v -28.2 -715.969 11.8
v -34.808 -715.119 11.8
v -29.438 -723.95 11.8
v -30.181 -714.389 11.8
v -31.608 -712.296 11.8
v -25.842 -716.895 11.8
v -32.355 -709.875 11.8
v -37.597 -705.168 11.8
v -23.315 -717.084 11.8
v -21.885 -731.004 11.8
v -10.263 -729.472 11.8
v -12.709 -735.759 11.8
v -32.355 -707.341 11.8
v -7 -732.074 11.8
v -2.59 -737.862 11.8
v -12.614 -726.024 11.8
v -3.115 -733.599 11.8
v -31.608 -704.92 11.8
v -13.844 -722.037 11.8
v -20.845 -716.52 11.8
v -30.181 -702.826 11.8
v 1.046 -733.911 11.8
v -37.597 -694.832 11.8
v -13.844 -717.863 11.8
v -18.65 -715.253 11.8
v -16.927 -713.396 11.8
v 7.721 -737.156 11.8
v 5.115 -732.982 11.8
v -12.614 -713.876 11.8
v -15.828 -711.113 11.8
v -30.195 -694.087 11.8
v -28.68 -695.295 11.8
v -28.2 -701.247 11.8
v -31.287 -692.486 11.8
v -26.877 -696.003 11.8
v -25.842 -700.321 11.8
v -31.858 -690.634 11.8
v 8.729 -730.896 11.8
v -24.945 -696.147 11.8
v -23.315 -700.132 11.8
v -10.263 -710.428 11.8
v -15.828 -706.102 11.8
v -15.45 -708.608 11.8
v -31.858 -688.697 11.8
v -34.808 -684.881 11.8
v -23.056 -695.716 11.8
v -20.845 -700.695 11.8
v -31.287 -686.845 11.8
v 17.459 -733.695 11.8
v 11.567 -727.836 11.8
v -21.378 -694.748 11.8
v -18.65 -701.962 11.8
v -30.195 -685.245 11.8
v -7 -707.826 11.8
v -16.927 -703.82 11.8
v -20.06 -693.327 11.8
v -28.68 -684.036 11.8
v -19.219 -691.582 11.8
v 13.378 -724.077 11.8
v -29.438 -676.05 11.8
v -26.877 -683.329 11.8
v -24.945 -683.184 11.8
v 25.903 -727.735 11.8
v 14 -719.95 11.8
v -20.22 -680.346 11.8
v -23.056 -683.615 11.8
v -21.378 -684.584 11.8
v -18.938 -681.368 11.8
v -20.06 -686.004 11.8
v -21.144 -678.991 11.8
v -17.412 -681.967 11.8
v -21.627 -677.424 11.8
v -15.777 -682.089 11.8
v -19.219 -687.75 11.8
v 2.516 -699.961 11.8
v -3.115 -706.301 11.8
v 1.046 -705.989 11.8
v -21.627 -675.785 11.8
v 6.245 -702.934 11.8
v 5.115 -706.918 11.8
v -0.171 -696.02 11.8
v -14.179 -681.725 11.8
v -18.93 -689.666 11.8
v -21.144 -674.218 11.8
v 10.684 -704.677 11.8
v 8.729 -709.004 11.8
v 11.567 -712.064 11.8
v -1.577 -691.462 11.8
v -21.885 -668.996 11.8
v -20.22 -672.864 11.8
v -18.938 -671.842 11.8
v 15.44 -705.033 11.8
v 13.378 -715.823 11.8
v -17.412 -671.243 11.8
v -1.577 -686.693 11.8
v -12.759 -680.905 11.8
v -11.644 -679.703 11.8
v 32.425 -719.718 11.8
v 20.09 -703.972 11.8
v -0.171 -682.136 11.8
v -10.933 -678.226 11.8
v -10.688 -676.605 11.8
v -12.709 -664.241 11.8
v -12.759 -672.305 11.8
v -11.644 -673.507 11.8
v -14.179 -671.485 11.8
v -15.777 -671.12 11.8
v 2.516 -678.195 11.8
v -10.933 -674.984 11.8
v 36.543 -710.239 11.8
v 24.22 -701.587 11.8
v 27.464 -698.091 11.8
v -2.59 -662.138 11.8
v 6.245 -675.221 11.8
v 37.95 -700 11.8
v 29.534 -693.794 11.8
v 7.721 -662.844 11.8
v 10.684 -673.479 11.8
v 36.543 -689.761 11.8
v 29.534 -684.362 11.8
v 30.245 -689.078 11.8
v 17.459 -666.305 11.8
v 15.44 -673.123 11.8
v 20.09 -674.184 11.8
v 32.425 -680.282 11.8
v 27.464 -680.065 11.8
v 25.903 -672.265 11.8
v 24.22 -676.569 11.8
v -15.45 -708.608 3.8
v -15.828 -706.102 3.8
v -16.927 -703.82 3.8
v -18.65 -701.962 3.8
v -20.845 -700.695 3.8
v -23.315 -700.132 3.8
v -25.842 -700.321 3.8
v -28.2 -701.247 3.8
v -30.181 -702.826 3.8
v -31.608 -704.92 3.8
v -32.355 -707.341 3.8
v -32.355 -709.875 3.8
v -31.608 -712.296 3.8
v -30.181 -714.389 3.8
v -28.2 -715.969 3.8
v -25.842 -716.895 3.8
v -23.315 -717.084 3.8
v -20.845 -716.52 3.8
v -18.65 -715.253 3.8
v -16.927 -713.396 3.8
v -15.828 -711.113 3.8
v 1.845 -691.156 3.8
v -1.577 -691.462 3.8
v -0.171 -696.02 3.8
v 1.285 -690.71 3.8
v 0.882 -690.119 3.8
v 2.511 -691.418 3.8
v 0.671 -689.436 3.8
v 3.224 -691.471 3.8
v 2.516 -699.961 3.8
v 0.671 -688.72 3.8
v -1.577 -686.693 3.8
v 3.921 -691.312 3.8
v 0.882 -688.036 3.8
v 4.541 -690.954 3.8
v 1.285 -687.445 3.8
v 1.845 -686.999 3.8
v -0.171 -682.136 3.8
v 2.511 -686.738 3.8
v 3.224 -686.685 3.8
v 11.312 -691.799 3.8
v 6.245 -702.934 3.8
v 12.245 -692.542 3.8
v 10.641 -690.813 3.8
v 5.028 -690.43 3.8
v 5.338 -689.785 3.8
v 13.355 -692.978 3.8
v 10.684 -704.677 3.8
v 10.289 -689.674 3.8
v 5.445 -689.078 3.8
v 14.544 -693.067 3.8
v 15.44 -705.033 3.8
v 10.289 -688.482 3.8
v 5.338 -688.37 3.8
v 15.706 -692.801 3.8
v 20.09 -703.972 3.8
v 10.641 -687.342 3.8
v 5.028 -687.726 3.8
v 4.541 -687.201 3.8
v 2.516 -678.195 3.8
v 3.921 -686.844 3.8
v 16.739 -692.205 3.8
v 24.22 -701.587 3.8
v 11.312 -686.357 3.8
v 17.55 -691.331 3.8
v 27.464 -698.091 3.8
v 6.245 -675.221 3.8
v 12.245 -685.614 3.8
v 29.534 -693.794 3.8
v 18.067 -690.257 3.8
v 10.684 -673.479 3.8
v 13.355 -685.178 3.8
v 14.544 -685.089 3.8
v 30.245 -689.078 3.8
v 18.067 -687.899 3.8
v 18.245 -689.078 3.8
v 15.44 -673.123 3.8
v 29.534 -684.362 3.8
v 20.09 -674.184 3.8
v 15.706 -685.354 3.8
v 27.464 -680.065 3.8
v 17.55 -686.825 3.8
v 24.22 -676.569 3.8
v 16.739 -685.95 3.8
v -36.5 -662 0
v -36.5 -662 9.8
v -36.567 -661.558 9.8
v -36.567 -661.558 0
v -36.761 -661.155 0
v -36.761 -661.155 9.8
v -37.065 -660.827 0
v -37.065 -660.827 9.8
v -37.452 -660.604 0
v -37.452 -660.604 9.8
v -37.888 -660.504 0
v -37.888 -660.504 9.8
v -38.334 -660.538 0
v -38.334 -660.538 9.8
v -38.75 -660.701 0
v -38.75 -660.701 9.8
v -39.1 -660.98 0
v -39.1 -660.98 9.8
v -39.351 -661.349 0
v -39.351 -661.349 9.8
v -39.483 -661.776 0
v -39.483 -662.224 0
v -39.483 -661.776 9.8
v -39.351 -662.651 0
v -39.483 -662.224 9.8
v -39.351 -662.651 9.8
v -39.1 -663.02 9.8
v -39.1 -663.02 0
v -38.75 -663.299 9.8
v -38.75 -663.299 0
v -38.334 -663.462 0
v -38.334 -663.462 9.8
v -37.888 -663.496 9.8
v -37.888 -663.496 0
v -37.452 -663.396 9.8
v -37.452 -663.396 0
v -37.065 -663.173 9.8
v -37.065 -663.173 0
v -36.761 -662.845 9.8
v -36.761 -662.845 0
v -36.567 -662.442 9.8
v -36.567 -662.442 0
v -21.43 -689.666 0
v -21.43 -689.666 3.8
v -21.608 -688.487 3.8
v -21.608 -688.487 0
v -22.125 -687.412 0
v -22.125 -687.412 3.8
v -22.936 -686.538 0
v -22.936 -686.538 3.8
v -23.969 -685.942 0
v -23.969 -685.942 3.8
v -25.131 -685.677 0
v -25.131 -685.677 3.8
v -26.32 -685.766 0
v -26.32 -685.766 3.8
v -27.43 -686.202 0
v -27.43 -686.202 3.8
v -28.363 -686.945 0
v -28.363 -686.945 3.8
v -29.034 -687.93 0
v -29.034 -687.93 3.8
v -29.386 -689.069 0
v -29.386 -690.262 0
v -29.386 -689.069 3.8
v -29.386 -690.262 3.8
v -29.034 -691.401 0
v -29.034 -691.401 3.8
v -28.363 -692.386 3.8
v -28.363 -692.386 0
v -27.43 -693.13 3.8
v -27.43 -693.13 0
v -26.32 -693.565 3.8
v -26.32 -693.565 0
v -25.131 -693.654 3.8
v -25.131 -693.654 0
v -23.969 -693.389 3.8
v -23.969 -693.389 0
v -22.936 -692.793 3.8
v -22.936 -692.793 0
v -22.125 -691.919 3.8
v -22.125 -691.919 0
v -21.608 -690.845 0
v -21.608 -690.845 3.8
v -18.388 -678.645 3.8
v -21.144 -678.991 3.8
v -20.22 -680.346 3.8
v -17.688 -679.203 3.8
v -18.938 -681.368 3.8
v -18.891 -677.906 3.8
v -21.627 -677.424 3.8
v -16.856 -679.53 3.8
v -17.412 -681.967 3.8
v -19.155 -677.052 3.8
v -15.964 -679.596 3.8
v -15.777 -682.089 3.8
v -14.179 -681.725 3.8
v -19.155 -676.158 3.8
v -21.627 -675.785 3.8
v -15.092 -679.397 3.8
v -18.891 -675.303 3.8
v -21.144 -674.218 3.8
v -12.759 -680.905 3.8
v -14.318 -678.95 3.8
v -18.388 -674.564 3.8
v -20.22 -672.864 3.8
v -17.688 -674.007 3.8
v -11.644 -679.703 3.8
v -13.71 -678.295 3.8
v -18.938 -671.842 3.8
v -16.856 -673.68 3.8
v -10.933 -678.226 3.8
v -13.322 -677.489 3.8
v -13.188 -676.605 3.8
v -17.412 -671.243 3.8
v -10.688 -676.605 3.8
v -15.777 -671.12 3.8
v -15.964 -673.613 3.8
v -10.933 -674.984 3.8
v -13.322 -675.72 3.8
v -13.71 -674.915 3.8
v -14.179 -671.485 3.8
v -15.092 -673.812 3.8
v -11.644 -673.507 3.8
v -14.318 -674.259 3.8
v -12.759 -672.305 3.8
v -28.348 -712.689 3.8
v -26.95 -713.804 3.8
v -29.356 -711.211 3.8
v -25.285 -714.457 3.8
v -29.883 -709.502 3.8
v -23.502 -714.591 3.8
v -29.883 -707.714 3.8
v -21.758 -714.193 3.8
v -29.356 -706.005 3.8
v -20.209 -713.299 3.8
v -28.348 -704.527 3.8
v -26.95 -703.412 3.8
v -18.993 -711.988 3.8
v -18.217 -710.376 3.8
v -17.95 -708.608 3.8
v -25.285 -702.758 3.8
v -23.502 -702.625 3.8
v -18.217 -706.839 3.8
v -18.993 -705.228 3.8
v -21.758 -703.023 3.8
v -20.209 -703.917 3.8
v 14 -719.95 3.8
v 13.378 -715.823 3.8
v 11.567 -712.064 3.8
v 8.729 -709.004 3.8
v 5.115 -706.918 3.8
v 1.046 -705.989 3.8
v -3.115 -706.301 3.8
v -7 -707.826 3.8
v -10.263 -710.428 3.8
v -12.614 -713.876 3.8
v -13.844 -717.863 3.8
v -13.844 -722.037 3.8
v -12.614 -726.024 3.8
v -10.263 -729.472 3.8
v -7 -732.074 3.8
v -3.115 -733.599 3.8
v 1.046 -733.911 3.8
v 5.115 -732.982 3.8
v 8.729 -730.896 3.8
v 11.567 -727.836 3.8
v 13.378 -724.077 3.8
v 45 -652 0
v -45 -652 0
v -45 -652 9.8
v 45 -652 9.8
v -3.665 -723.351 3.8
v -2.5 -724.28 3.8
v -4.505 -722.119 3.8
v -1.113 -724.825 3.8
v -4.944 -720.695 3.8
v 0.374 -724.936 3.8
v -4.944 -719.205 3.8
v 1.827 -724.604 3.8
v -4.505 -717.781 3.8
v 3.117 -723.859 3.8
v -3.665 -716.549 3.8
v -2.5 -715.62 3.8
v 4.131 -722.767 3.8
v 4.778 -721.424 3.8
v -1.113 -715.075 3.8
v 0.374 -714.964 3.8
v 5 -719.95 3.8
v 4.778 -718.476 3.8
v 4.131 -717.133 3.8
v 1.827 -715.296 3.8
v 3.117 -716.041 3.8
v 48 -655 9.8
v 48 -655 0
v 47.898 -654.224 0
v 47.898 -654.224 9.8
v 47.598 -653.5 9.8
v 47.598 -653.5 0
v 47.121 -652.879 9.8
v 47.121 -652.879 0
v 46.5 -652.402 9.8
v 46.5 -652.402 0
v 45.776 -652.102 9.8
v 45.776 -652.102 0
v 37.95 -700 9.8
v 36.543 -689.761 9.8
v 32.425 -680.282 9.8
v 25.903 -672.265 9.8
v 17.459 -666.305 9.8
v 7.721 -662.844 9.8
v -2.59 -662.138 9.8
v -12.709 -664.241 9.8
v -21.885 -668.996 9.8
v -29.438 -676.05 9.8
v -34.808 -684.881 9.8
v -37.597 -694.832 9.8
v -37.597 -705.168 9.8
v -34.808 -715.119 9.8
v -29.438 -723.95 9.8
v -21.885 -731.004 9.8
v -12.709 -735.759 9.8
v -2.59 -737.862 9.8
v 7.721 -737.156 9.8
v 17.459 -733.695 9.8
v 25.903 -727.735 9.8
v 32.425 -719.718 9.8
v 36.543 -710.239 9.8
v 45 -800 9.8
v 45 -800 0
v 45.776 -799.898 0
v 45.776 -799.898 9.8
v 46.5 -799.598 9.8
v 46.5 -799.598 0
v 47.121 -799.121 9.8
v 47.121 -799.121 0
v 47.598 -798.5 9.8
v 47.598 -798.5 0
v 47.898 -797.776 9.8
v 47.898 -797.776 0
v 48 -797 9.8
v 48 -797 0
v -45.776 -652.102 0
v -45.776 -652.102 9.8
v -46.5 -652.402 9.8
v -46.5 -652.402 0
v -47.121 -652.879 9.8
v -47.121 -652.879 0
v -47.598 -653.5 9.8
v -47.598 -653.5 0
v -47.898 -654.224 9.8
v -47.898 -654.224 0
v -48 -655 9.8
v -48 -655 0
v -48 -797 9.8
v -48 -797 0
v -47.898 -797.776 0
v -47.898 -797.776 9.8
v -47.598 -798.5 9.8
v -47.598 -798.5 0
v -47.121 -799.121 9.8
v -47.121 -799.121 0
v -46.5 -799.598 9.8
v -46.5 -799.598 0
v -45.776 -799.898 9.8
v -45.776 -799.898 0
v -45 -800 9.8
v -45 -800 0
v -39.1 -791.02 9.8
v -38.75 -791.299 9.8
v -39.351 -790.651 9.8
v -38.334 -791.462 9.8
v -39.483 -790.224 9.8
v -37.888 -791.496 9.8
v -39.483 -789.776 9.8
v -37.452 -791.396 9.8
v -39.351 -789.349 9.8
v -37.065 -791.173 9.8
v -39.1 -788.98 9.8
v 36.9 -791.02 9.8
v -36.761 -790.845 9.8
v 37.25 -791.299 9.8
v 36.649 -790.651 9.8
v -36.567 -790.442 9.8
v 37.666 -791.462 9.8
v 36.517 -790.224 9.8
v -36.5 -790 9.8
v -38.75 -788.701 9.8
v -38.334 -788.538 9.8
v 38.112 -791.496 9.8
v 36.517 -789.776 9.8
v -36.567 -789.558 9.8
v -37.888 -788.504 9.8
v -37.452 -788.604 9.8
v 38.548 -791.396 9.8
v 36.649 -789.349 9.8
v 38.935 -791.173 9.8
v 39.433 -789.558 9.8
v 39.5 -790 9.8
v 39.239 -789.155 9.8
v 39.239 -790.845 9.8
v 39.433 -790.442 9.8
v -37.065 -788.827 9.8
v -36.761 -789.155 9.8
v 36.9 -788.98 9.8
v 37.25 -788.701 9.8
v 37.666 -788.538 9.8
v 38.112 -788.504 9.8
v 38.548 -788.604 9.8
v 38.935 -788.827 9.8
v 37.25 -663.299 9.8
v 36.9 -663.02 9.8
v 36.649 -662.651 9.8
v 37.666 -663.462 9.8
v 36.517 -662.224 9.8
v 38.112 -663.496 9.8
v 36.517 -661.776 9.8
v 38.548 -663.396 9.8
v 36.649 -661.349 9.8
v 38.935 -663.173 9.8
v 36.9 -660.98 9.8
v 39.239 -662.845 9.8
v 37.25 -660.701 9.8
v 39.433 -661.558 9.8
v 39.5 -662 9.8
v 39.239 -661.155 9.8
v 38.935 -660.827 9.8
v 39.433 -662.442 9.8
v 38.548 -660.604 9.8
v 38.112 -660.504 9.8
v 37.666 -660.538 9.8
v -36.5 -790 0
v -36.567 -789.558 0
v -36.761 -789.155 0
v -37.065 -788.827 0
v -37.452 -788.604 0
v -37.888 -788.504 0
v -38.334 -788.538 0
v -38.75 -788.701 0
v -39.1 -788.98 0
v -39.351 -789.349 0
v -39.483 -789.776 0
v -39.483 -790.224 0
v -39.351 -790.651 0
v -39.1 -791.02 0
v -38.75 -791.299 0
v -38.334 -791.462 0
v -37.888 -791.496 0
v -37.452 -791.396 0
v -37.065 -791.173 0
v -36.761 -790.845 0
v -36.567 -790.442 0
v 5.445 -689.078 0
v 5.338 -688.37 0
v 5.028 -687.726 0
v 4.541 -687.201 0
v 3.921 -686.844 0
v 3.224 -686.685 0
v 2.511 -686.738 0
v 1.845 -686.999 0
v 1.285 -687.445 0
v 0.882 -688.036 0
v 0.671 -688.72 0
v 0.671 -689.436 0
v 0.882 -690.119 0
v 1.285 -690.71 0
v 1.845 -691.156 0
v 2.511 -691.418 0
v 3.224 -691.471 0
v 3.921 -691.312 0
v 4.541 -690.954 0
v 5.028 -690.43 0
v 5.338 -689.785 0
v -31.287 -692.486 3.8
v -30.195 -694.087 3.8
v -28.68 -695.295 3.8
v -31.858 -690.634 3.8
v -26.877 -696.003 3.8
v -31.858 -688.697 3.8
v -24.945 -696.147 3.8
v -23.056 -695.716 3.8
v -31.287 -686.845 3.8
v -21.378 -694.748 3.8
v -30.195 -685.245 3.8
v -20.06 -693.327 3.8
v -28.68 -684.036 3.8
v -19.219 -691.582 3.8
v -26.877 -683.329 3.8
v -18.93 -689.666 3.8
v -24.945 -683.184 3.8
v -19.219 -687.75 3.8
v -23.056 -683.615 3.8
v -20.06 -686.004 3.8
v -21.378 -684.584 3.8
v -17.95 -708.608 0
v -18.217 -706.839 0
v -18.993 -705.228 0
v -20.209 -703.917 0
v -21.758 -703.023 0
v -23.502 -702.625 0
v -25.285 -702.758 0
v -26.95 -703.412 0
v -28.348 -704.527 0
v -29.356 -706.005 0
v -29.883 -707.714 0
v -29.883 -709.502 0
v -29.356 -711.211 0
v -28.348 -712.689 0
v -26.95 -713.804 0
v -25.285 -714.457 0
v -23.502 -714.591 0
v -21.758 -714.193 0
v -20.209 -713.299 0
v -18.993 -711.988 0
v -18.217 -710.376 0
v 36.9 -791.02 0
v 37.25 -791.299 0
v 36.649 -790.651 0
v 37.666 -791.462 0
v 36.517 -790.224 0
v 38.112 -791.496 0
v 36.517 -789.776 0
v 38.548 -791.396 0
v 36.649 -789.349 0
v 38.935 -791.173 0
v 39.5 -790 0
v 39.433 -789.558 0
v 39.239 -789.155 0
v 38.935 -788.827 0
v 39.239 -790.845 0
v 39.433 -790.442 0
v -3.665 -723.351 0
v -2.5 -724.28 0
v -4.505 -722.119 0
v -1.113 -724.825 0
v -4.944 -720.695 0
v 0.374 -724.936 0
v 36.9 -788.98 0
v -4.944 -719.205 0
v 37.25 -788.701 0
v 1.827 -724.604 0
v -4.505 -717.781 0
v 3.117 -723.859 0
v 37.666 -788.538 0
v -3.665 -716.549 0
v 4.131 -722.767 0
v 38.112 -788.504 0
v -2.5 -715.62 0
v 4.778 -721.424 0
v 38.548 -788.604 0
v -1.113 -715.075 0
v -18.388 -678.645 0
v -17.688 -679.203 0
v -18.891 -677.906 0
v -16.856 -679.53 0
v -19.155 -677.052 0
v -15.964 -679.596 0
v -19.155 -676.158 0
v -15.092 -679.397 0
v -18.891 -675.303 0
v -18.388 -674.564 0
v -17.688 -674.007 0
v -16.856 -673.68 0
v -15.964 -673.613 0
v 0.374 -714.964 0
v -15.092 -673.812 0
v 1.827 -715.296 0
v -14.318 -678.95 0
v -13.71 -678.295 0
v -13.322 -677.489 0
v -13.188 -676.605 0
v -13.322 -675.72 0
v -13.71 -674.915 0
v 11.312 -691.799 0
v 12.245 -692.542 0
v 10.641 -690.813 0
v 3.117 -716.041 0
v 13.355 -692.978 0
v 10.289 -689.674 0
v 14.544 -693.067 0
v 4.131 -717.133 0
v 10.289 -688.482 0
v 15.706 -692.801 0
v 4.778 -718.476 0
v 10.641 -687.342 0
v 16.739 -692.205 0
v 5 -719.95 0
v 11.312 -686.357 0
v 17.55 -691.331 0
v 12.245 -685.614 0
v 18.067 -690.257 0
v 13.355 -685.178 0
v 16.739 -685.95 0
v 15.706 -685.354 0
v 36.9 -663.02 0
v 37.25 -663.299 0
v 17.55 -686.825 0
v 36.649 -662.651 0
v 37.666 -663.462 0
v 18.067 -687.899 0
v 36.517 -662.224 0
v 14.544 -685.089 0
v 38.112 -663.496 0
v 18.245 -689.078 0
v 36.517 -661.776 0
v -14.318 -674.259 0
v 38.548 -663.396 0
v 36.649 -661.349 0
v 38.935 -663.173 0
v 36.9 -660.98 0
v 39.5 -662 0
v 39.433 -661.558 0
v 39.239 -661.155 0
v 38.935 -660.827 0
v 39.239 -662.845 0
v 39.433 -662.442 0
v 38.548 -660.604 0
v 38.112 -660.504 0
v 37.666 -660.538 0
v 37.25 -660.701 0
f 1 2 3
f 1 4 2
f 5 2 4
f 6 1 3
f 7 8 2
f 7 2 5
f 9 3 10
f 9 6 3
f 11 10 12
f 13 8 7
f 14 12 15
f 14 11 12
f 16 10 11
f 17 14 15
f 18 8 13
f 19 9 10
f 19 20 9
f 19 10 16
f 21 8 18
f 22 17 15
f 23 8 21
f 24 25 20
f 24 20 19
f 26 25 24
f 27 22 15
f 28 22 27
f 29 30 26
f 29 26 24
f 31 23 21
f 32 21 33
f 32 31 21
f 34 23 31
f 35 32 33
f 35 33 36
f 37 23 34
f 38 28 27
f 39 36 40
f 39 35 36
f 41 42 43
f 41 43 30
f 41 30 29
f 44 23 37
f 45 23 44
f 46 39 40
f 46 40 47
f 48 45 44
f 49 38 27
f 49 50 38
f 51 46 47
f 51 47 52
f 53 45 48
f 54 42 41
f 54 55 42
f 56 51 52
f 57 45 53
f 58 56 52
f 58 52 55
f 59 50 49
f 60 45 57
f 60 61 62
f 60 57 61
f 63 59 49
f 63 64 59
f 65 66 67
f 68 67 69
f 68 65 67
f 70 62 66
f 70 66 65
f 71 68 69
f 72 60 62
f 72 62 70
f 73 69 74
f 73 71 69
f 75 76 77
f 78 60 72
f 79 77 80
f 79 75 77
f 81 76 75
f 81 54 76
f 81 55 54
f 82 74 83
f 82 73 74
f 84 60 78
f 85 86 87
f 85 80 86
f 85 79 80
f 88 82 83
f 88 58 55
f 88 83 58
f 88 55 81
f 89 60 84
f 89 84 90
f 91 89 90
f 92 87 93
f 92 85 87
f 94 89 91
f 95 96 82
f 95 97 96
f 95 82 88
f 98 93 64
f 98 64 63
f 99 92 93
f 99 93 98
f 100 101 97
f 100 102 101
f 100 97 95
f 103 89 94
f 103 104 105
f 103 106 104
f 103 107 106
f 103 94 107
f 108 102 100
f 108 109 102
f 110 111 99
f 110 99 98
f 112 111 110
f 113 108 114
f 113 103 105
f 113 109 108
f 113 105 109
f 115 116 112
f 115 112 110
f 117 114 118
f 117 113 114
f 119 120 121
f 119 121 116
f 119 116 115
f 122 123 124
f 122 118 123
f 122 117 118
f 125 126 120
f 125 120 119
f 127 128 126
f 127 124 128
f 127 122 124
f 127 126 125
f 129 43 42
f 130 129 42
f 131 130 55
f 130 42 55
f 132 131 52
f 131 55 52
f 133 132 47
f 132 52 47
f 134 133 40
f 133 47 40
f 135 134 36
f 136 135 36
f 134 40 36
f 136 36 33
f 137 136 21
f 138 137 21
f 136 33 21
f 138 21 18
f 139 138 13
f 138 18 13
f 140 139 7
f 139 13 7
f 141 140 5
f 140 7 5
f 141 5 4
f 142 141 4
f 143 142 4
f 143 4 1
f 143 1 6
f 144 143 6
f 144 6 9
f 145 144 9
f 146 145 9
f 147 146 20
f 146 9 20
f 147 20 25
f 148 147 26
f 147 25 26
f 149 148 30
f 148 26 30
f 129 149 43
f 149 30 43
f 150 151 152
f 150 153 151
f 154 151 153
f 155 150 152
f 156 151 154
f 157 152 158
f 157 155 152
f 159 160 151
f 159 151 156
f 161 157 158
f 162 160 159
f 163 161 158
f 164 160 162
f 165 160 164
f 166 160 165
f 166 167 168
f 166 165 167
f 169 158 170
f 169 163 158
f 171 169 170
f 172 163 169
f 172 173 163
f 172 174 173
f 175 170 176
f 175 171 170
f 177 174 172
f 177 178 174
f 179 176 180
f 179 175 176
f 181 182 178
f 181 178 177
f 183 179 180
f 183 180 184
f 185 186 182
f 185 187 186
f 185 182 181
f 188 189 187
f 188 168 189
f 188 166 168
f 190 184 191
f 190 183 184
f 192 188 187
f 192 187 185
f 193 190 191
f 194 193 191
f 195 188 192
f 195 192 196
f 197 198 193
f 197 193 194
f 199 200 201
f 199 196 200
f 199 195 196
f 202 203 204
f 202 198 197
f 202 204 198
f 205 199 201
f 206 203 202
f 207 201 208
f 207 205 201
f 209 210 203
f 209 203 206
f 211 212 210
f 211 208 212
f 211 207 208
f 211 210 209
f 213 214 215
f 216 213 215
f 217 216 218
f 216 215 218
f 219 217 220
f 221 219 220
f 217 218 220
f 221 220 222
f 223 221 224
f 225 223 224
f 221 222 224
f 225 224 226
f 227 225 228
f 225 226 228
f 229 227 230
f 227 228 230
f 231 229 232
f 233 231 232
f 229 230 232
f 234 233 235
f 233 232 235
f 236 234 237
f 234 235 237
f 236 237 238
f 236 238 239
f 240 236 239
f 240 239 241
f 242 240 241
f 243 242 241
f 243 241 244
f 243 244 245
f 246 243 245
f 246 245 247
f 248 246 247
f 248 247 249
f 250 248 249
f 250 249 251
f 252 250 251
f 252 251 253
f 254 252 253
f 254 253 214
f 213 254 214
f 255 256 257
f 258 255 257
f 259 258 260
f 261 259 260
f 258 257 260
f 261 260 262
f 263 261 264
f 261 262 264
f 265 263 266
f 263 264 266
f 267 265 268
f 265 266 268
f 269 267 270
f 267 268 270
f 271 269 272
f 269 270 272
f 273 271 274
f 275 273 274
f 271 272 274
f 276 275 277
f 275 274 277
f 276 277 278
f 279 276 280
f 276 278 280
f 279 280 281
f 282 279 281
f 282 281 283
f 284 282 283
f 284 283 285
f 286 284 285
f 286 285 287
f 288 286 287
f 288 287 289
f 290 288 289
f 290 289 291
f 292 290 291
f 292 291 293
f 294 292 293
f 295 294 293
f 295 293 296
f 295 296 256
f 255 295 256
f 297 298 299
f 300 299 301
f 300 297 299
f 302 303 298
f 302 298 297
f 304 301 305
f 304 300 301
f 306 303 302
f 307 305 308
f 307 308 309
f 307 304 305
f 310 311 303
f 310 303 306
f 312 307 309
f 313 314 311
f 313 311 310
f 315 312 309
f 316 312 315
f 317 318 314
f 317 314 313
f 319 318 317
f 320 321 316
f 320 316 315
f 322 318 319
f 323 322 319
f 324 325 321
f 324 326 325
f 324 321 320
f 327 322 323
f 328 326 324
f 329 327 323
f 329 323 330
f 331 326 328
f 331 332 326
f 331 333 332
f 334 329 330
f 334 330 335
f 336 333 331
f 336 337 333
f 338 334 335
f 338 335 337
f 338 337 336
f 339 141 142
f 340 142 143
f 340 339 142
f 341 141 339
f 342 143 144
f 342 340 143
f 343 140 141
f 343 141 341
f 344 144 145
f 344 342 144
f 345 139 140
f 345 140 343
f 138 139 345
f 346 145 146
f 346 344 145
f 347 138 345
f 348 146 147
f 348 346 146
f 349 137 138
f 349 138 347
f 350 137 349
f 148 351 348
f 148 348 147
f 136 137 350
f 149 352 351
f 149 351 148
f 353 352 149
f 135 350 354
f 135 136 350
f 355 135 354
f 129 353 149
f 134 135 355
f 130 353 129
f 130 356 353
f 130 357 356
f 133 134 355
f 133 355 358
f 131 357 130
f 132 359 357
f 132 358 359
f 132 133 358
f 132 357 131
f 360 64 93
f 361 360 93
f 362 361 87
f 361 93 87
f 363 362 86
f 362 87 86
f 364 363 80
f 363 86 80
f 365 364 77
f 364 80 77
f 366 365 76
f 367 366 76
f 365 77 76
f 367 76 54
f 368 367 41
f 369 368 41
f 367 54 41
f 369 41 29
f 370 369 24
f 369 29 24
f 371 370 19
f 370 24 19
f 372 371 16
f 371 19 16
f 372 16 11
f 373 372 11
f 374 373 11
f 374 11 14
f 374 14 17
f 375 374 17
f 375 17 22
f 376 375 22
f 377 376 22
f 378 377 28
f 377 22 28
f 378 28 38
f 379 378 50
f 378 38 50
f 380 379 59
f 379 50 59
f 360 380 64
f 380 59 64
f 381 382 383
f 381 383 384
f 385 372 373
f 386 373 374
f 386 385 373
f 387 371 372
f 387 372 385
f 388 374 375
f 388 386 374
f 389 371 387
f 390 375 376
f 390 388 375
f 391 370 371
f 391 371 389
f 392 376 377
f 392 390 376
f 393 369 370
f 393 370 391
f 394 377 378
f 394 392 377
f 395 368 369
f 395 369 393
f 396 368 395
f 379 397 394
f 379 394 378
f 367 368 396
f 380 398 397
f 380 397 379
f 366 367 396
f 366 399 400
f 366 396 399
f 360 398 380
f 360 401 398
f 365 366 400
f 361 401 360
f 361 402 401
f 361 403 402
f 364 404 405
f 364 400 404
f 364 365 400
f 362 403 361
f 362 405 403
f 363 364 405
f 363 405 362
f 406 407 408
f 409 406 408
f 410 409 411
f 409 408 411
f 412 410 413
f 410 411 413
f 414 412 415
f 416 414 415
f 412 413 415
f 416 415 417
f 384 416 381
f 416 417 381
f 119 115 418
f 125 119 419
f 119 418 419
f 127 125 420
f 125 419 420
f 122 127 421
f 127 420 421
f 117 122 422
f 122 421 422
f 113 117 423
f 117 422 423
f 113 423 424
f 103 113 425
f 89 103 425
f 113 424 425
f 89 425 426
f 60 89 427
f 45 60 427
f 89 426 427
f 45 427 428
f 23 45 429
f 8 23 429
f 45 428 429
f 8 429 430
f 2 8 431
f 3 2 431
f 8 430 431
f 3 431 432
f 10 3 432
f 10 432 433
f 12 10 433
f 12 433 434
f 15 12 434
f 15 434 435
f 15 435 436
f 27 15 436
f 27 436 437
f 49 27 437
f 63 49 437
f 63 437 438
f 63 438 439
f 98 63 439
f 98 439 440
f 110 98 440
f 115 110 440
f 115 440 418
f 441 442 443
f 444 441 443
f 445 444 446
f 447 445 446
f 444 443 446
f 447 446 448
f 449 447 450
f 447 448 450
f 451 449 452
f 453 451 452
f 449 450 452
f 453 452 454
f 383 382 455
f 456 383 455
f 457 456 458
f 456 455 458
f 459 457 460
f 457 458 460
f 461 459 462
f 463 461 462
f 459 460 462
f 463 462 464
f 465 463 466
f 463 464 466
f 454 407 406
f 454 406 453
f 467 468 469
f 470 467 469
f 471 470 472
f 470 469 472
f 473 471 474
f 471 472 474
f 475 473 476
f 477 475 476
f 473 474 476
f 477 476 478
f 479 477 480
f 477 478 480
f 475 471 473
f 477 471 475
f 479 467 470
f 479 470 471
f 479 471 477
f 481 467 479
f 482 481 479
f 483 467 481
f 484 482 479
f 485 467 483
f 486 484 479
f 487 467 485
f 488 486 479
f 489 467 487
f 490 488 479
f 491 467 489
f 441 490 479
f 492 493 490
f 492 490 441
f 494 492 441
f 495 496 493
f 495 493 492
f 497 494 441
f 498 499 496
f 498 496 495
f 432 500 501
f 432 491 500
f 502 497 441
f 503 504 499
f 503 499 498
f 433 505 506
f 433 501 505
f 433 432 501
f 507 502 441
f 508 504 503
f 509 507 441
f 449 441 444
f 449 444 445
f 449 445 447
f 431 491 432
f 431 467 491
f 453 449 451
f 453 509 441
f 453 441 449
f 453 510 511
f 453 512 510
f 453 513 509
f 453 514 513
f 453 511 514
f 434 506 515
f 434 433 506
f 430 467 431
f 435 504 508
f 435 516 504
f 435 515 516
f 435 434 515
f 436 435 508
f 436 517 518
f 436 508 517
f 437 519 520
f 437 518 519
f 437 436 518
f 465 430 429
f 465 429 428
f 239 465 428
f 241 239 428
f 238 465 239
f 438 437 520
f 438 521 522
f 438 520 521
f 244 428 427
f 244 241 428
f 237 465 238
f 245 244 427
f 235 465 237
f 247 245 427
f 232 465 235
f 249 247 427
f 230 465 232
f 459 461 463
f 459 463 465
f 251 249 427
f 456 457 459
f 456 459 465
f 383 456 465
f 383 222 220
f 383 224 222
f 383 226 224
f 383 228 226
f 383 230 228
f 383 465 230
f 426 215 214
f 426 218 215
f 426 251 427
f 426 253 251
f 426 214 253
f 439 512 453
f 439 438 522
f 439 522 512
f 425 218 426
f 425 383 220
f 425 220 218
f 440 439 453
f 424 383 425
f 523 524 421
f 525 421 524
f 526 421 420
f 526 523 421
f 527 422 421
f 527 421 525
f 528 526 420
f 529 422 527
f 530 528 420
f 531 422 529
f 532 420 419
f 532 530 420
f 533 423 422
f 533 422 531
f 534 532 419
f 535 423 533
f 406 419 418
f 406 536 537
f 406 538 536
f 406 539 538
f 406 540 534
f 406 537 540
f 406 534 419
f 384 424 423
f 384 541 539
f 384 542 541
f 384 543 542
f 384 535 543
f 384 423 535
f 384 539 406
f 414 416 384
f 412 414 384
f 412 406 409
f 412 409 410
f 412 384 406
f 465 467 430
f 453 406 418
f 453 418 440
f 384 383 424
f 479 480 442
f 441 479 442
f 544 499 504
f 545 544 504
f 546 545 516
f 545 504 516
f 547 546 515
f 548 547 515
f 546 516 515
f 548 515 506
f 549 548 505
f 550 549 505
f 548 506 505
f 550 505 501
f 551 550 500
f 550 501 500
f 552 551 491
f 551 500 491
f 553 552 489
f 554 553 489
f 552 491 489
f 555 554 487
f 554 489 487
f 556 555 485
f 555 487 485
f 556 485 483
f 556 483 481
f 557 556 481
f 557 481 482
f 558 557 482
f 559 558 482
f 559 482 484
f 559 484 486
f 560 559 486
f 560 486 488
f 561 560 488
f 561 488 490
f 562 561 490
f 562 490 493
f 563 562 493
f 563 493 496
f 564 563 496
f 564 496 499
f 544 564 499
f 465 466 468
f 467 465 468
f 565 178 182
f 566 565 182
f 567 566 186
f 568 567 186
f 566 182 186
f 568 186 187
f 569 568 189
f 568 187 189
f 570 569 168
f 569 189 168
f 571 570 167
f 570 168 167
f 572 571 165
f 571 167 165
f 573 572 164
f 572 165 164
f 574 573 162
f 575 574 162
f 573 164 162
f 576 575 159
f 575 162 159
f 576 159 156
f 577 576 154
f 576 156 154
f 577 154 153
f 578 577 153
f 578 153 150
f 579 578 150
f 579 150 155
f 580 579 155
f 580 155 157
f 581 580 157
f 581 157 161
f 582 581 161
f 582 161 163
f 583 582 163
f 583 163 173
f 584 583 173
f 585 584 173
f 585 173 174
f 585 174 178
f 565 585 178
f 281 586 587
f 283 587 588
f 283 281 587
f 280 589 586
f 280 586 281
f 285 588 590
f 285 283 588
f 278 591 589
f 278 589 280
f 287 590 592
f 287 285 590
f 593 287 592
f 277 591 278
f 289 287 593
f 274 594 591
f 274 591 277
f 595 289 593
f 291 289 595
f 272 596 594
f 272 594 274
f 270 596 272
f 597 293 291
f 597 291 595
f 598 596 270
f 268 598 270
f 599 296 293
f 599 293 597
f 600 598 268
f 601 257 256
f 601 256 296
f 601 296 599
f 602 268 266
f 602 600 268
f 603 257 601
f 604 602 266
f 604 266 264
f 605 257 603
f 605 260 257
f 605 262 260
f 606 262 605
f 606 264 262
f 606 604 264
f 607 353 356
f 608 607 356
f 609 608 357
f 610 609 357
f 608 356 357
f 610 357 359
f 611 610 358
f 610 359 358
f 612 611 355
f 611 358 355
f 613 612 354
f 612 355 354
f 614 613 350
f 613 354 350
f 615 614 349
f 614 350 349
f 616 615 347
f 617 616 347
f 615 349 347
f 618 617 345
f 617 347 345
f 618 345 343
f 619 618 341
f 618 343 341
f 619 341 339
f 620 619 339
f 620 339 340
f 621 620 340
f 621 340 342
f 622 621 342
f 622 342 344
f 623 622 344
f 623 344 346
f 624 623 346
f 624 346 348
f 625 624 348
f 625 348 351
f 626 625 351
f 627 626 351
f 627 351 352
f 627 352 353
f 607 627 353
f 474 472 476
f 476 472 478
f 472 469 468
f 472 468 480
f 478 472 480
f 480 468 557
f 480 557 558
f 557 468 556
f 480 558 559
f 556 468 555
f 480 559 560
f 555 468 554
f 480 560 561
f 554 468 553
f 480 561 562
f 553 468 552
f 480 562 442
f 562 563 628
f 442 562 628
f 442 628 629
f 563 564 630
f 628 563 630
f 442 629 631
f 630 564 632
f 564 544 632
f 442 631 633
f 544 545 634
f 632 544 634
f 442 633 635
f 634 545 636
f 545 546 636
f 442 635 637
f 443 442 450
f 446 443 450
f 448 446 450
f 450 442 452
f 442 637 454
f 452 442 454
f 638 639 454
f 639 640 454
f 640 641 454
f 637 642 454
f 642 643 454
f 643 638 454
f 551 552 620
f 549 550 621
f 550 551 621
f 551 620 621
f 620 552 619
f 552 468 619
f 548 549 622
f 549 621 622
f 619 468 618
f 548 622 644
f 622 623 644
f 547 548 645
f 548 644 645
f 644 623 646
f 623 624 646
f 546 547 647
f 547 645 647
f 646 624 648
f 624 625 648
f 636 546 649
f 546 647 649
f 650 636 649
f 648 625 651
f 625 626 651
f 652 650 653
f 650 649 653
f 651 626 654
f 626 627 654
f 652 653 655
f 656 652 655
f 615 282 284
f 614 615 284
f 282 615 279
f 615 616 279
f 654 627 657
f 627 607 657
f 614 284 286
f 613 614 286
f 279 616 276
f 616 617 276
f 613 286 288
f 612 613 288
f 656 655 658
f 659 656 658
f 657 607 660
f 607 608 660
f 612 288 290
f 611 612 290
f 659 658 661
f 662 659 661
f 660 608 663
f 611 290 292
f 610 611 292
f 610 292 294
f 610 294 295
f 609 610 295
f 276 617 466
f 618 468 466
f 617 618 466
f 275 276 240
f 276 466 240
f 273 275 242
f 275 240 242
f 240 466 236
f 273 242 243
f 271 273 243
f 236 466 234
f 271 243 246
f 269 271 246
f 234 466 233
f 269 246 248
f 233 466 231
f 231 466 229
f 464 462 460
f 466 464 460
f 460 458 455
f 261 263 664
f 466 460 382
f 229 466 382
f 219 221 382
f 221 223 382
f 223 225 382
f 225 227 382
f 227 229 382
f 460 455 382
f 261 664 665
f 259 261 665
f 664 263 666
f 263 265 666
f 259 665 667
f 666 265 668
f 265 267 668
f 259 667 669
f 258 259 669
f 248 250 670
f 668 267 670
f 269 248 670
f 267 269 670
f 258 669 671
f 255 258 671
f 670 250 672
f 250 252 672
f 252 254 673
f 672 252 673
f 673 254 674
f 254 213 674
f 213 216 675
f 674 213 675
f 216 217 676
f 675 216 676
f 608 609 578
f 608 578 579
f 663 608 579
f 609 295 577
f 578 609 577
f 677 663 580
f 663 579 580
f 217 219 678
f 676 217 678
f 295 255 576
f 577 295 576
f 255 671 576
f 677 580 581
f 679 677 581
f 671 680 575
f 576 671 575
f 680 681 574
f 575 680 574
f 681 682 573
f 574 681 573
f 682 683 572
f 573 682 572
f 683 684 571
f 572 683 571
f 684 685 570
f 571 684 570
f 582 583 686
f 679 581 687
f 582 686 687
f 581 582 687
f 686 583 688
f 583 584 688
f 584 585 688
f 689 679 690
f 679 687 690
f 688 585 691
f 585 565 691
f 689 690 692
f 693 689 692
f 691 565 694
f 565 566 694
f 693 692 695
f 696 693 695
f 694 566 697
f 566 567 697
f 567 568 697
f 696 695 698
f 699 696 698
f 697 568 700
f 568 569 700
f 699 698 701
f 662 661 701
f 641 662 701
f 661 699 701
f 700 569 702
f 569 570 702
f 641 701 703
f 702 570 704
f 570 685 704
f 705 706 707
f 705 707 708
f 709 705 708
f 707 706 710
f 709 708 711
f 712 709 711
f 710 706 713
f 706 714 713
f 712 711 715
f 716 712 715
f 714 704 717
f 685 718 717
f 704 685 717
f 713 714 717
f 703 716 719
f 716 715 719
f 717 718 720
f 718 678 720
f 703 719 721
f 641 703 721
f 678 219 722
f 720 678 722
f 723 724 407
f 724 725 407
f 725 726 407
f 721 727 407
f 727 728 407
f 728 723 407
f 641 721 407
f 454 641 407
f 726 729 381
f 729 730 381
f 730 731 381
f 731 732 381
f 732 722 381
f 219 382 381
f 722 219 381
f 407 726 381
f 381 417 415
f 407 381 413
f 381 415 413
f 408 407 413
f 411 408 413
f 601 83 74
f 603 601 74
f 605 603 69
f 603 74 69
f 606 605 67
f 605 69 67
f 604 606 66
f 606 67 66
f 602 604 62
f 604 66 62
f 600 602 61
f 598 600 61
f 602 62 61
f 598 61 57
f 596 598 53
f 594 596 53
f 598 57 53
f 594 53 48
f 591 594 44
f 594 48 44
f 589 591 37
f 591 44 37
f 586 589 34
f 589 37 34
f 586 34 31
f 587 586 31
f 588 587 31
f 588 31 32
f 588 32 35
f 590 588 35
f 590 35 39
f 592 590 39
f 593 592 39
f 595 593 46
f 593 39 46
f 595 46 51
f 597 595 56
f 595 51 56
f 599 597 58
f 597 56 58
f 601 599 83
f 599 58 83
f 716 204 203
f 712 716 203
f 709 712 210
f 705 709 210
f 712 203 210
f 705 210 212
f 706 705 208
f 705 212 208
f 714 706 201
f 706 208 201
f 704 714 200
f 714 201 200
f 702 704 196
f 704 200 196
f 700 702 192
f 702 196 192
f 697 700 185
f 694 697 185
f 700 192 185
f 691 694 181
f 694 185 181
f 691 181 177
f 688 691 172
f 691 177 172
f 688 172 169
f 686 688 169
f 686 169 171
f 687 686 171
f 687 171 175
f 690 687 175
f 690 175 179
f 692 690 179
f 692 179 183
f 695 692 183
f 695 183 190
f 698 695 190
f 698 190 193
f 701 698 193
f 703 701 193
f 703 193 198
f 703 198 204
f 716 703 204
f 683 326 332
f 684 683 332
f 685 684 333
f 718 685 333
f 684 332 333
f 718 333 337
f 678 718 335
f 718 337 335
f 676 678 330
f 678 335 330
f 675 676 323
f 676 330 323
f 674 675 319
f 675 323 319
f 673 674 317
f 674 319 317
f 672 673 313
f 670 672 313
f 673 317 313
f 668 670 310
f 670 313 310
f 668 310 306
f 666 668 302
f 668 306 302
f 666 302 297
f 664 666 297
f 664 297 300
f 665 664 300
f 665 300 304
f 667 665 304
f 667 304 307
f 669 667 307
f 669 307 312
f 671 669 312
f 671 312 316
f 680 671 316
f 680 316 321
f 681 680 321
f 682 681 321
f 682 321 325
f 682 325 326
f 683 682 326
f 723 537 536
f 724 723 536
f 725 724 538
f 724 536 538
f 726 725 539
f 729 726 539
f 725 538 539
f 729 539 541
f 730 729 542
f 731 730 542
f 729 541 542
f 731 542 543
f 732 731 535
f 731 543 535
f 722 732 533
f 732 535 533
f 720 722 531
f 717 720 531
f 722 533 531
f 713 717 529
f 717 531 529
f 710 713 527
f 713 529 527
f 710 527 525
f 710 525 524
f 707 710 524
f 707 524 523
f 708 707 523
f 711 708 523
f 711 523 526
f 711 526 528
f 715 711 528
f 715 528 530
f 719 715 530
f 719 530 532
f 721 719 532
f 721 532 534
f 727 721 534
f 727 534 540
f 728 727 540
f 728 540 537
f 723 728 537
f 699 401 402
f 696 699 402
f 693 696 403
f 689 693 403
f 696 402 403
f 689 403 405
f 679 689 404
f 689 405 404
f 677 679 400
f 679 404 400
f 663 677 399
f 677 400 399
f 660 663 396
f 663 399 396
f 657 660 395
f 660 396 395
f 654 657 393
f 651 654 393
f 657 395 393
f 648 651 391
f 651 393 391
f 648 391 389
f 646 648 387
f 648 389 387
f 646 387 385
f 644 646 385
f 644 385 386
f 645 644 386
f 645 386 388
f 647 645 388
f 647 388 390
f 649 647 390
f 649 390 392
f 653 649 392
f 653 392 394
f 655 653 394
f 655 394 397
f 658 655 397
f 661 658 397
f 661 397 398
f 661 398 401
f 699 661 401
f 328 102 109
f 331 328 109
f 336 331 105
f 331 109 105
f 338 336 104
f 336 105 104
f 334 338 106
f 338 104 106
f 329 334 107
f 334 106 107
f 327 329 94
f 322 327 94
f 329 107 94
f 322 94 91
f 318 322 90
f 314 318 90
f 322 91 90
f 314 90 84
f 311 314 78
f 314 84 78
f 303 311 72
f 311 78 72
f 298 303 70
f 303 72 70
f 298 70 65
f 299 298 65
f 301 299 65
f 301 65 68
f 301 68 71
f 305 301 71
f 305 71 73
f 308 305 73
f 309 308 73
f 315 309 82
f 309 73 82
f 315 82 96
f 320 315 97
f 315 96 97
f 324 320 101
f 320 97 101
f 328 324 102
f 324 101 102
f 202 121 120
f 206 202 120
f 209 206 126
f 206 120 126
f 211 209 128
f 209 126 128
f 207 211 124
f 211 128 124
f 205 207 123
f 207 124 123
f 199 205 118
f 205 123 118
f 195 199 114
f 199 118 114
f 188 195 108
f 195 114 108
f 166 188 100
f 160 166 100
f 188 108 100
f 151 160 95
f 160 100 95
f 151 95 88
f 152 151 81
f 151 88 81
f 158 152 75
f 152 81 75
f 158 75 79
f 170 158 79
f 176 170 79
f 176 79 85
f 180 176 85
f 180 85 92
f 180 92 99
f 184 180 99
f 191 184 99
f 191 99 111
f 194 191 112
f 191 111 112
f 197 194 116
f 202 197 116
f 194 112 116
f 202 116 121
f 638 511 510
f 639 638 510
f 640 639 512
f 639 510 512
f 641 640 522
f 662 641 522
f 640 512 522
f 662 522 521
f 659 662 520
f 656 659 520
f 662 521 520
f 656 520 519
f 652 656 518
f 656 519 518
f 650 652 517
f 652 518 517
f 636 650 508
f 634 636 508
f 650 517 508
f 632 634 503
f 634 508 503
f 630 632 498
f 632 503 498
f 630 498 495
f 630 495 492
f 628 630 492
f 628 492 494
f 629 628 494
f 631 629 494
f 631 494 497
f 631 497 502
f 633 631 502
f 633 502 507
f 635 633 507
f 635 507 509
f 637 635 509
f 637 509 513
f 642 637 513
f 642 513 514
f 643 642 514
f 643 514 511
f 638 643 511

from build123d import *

# Parameters (mm, degrees)
PAD004_DEPTH    = 9.8
SKETCH080_R     = 37.95
PAD016_DEPTH    = 11.8
SKETCH081_R     = 5.5
SKETCH081_R_2   = 6.5
SKETCH081_R_3   = 8.5
SKETCH081_R_4   = 14
SKETCH081_R_5   = 16
POCKET007_DEPTH = 8
SKETCH082_R     = 1.5
SKETCH082_R_2   = 4
SKETCH082_R_3   = 2.4
SKETCH082_R_4   = 3
SKETCH082_R_5   = 6
SKETCH082_R_6   = 5
POCKET008_DEPTH = 11.801


with BuildPart() as part:
    # Sketch041 → Pad004 (new body)
    with BuildSketch(Plane.XY):
        with BuildLine():
            Line((-48, 145), (-48, 3))
            ThreePointArc((-48, 3), (-47.12132, 0.87868), (-45, 0))
            Line((-45, 0), (45, 0))
            ThreePointArc((45, 0), (47.12132, 0.87868), (48, 3))
            Line((48, 145), (48, 3))
            ThreePointArc((48, 145), (47.12132, 147.12132), (45, 148))
            Line((-45, 148), (45, 148))
            ThreePointArc((-45, 148), (-47.12132, 147.12132), (-48, 145))
        make_face()
    extrude(amount=PAD004_DEPTH)

    # Sketch080 (on Pad) → Pad016 (join)
    with BuildSketch(Plane.XY):
        with Locations((0, 100)):
            Circle(SKETCH080_R)
    extrude(amount=PAD016_DEPTH)

    # Sketch081 (on Face13 of Pad016) → Pocket007 (cut)
    with BuildSketch(Plane.XY.offset(11.8)):
        with Locations((-16.188435, 123.395236)):
            Circle(SKETCH081_R)
        with Locations((-25.430368, 110.334353)):
            Circle(SKETCH081_R_2)
        with Locations((-23.950087, 91.392105)):
            Circle(SKETCH081_R_3)
        with Locations((0, 80.05)):
            Circle(SKETCH081_R_4)
        with Locations((14.244595, 110.92218)):
            Circle(SKETCH081_R_5)
    extrude(amount=-POCKET007_DEPTH, mode=Mode.SUBTRACT)

    # Sketch082 (on Face13 of Pocket007) → Pocket008 (cut, through all)
    with BuildSketch(Plane.XY.offset(11.8)):
        with Locations((-38, 138)):
            Circle(SKETCH082_R)
        with Locations((38, 138)):
            Circle(SKETCH082_R)
        with Locations((14.244595, 110.92218)):
            Circle(SKETCH082_R_2)
        with Locations((3.044595, 110.92218)):
            Circle(SKETCH082_R_3)
        with Locations((-16.188435, 123.395236)):
            Circle(SKETCH082_R_4)
        with Locations((-25.430368, 110.334353)):
            Circle(SKETCH082_R_2)
        with Locations((-23.950087, 91.392105)):
            Circle(SKETCH082_R_5)
        with Locations((0, 80.05)):
            Circle(SKETCH082_R_6)
        with Locations((-38, 10)):
            Circle(SKETCH082_R)
        with Locations((38, 10)):
            Circle(SKETCH082_R)
    extrude(amount=-POCKET008_DEPTH, mode=Mode.SUBTRACT)


with BuildPart() as part_1:
    # Body002 placement: moved
    add(part.part.moved(Location((0, -800, 0))))


solid = part_1.part
